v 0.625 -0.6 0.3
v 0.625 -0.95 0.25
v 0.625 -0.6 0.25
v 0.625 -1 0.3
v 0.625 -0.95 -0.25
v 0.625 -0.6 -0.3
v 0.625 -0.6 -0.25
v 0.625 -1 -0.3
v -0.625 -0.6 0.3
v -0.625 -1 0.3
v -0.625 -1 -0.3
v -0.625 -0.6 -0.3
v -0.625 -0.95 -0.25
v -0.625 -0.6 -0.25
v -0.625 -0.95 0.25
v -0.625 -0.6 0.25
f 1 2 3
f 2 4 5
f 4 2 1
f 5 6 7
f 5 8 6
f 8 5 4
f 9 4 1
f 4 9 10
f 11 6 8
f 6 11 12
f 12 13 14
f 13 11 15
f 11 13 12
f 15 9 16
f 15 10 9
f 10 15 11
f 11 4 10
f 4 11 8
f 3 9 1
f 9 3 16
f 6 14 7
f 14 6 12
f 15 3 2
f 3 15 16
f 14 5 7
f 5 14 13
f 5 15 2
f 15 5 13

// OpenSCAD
W=1.25;
L=2.0;
a=0.4;
b=0.4;
t=0.6;
module pin(){
    difference(){
    cube([W,b,t],center = true);
    #translate([-W/2,-b/2,-t/2+0.05]) cube([W,b-0.05,t-0.1]);    
    }
}
module smd0805(){
    %cube([W,L-0.1,t-0.1],center=true);
    mirror([0,1,0])
    color("grey")translate([0,L/2-b/2,0]) pin();
    %color("grey")translate([0,L/2-b/2,0]) pin();
    }
    
    smd0805();
